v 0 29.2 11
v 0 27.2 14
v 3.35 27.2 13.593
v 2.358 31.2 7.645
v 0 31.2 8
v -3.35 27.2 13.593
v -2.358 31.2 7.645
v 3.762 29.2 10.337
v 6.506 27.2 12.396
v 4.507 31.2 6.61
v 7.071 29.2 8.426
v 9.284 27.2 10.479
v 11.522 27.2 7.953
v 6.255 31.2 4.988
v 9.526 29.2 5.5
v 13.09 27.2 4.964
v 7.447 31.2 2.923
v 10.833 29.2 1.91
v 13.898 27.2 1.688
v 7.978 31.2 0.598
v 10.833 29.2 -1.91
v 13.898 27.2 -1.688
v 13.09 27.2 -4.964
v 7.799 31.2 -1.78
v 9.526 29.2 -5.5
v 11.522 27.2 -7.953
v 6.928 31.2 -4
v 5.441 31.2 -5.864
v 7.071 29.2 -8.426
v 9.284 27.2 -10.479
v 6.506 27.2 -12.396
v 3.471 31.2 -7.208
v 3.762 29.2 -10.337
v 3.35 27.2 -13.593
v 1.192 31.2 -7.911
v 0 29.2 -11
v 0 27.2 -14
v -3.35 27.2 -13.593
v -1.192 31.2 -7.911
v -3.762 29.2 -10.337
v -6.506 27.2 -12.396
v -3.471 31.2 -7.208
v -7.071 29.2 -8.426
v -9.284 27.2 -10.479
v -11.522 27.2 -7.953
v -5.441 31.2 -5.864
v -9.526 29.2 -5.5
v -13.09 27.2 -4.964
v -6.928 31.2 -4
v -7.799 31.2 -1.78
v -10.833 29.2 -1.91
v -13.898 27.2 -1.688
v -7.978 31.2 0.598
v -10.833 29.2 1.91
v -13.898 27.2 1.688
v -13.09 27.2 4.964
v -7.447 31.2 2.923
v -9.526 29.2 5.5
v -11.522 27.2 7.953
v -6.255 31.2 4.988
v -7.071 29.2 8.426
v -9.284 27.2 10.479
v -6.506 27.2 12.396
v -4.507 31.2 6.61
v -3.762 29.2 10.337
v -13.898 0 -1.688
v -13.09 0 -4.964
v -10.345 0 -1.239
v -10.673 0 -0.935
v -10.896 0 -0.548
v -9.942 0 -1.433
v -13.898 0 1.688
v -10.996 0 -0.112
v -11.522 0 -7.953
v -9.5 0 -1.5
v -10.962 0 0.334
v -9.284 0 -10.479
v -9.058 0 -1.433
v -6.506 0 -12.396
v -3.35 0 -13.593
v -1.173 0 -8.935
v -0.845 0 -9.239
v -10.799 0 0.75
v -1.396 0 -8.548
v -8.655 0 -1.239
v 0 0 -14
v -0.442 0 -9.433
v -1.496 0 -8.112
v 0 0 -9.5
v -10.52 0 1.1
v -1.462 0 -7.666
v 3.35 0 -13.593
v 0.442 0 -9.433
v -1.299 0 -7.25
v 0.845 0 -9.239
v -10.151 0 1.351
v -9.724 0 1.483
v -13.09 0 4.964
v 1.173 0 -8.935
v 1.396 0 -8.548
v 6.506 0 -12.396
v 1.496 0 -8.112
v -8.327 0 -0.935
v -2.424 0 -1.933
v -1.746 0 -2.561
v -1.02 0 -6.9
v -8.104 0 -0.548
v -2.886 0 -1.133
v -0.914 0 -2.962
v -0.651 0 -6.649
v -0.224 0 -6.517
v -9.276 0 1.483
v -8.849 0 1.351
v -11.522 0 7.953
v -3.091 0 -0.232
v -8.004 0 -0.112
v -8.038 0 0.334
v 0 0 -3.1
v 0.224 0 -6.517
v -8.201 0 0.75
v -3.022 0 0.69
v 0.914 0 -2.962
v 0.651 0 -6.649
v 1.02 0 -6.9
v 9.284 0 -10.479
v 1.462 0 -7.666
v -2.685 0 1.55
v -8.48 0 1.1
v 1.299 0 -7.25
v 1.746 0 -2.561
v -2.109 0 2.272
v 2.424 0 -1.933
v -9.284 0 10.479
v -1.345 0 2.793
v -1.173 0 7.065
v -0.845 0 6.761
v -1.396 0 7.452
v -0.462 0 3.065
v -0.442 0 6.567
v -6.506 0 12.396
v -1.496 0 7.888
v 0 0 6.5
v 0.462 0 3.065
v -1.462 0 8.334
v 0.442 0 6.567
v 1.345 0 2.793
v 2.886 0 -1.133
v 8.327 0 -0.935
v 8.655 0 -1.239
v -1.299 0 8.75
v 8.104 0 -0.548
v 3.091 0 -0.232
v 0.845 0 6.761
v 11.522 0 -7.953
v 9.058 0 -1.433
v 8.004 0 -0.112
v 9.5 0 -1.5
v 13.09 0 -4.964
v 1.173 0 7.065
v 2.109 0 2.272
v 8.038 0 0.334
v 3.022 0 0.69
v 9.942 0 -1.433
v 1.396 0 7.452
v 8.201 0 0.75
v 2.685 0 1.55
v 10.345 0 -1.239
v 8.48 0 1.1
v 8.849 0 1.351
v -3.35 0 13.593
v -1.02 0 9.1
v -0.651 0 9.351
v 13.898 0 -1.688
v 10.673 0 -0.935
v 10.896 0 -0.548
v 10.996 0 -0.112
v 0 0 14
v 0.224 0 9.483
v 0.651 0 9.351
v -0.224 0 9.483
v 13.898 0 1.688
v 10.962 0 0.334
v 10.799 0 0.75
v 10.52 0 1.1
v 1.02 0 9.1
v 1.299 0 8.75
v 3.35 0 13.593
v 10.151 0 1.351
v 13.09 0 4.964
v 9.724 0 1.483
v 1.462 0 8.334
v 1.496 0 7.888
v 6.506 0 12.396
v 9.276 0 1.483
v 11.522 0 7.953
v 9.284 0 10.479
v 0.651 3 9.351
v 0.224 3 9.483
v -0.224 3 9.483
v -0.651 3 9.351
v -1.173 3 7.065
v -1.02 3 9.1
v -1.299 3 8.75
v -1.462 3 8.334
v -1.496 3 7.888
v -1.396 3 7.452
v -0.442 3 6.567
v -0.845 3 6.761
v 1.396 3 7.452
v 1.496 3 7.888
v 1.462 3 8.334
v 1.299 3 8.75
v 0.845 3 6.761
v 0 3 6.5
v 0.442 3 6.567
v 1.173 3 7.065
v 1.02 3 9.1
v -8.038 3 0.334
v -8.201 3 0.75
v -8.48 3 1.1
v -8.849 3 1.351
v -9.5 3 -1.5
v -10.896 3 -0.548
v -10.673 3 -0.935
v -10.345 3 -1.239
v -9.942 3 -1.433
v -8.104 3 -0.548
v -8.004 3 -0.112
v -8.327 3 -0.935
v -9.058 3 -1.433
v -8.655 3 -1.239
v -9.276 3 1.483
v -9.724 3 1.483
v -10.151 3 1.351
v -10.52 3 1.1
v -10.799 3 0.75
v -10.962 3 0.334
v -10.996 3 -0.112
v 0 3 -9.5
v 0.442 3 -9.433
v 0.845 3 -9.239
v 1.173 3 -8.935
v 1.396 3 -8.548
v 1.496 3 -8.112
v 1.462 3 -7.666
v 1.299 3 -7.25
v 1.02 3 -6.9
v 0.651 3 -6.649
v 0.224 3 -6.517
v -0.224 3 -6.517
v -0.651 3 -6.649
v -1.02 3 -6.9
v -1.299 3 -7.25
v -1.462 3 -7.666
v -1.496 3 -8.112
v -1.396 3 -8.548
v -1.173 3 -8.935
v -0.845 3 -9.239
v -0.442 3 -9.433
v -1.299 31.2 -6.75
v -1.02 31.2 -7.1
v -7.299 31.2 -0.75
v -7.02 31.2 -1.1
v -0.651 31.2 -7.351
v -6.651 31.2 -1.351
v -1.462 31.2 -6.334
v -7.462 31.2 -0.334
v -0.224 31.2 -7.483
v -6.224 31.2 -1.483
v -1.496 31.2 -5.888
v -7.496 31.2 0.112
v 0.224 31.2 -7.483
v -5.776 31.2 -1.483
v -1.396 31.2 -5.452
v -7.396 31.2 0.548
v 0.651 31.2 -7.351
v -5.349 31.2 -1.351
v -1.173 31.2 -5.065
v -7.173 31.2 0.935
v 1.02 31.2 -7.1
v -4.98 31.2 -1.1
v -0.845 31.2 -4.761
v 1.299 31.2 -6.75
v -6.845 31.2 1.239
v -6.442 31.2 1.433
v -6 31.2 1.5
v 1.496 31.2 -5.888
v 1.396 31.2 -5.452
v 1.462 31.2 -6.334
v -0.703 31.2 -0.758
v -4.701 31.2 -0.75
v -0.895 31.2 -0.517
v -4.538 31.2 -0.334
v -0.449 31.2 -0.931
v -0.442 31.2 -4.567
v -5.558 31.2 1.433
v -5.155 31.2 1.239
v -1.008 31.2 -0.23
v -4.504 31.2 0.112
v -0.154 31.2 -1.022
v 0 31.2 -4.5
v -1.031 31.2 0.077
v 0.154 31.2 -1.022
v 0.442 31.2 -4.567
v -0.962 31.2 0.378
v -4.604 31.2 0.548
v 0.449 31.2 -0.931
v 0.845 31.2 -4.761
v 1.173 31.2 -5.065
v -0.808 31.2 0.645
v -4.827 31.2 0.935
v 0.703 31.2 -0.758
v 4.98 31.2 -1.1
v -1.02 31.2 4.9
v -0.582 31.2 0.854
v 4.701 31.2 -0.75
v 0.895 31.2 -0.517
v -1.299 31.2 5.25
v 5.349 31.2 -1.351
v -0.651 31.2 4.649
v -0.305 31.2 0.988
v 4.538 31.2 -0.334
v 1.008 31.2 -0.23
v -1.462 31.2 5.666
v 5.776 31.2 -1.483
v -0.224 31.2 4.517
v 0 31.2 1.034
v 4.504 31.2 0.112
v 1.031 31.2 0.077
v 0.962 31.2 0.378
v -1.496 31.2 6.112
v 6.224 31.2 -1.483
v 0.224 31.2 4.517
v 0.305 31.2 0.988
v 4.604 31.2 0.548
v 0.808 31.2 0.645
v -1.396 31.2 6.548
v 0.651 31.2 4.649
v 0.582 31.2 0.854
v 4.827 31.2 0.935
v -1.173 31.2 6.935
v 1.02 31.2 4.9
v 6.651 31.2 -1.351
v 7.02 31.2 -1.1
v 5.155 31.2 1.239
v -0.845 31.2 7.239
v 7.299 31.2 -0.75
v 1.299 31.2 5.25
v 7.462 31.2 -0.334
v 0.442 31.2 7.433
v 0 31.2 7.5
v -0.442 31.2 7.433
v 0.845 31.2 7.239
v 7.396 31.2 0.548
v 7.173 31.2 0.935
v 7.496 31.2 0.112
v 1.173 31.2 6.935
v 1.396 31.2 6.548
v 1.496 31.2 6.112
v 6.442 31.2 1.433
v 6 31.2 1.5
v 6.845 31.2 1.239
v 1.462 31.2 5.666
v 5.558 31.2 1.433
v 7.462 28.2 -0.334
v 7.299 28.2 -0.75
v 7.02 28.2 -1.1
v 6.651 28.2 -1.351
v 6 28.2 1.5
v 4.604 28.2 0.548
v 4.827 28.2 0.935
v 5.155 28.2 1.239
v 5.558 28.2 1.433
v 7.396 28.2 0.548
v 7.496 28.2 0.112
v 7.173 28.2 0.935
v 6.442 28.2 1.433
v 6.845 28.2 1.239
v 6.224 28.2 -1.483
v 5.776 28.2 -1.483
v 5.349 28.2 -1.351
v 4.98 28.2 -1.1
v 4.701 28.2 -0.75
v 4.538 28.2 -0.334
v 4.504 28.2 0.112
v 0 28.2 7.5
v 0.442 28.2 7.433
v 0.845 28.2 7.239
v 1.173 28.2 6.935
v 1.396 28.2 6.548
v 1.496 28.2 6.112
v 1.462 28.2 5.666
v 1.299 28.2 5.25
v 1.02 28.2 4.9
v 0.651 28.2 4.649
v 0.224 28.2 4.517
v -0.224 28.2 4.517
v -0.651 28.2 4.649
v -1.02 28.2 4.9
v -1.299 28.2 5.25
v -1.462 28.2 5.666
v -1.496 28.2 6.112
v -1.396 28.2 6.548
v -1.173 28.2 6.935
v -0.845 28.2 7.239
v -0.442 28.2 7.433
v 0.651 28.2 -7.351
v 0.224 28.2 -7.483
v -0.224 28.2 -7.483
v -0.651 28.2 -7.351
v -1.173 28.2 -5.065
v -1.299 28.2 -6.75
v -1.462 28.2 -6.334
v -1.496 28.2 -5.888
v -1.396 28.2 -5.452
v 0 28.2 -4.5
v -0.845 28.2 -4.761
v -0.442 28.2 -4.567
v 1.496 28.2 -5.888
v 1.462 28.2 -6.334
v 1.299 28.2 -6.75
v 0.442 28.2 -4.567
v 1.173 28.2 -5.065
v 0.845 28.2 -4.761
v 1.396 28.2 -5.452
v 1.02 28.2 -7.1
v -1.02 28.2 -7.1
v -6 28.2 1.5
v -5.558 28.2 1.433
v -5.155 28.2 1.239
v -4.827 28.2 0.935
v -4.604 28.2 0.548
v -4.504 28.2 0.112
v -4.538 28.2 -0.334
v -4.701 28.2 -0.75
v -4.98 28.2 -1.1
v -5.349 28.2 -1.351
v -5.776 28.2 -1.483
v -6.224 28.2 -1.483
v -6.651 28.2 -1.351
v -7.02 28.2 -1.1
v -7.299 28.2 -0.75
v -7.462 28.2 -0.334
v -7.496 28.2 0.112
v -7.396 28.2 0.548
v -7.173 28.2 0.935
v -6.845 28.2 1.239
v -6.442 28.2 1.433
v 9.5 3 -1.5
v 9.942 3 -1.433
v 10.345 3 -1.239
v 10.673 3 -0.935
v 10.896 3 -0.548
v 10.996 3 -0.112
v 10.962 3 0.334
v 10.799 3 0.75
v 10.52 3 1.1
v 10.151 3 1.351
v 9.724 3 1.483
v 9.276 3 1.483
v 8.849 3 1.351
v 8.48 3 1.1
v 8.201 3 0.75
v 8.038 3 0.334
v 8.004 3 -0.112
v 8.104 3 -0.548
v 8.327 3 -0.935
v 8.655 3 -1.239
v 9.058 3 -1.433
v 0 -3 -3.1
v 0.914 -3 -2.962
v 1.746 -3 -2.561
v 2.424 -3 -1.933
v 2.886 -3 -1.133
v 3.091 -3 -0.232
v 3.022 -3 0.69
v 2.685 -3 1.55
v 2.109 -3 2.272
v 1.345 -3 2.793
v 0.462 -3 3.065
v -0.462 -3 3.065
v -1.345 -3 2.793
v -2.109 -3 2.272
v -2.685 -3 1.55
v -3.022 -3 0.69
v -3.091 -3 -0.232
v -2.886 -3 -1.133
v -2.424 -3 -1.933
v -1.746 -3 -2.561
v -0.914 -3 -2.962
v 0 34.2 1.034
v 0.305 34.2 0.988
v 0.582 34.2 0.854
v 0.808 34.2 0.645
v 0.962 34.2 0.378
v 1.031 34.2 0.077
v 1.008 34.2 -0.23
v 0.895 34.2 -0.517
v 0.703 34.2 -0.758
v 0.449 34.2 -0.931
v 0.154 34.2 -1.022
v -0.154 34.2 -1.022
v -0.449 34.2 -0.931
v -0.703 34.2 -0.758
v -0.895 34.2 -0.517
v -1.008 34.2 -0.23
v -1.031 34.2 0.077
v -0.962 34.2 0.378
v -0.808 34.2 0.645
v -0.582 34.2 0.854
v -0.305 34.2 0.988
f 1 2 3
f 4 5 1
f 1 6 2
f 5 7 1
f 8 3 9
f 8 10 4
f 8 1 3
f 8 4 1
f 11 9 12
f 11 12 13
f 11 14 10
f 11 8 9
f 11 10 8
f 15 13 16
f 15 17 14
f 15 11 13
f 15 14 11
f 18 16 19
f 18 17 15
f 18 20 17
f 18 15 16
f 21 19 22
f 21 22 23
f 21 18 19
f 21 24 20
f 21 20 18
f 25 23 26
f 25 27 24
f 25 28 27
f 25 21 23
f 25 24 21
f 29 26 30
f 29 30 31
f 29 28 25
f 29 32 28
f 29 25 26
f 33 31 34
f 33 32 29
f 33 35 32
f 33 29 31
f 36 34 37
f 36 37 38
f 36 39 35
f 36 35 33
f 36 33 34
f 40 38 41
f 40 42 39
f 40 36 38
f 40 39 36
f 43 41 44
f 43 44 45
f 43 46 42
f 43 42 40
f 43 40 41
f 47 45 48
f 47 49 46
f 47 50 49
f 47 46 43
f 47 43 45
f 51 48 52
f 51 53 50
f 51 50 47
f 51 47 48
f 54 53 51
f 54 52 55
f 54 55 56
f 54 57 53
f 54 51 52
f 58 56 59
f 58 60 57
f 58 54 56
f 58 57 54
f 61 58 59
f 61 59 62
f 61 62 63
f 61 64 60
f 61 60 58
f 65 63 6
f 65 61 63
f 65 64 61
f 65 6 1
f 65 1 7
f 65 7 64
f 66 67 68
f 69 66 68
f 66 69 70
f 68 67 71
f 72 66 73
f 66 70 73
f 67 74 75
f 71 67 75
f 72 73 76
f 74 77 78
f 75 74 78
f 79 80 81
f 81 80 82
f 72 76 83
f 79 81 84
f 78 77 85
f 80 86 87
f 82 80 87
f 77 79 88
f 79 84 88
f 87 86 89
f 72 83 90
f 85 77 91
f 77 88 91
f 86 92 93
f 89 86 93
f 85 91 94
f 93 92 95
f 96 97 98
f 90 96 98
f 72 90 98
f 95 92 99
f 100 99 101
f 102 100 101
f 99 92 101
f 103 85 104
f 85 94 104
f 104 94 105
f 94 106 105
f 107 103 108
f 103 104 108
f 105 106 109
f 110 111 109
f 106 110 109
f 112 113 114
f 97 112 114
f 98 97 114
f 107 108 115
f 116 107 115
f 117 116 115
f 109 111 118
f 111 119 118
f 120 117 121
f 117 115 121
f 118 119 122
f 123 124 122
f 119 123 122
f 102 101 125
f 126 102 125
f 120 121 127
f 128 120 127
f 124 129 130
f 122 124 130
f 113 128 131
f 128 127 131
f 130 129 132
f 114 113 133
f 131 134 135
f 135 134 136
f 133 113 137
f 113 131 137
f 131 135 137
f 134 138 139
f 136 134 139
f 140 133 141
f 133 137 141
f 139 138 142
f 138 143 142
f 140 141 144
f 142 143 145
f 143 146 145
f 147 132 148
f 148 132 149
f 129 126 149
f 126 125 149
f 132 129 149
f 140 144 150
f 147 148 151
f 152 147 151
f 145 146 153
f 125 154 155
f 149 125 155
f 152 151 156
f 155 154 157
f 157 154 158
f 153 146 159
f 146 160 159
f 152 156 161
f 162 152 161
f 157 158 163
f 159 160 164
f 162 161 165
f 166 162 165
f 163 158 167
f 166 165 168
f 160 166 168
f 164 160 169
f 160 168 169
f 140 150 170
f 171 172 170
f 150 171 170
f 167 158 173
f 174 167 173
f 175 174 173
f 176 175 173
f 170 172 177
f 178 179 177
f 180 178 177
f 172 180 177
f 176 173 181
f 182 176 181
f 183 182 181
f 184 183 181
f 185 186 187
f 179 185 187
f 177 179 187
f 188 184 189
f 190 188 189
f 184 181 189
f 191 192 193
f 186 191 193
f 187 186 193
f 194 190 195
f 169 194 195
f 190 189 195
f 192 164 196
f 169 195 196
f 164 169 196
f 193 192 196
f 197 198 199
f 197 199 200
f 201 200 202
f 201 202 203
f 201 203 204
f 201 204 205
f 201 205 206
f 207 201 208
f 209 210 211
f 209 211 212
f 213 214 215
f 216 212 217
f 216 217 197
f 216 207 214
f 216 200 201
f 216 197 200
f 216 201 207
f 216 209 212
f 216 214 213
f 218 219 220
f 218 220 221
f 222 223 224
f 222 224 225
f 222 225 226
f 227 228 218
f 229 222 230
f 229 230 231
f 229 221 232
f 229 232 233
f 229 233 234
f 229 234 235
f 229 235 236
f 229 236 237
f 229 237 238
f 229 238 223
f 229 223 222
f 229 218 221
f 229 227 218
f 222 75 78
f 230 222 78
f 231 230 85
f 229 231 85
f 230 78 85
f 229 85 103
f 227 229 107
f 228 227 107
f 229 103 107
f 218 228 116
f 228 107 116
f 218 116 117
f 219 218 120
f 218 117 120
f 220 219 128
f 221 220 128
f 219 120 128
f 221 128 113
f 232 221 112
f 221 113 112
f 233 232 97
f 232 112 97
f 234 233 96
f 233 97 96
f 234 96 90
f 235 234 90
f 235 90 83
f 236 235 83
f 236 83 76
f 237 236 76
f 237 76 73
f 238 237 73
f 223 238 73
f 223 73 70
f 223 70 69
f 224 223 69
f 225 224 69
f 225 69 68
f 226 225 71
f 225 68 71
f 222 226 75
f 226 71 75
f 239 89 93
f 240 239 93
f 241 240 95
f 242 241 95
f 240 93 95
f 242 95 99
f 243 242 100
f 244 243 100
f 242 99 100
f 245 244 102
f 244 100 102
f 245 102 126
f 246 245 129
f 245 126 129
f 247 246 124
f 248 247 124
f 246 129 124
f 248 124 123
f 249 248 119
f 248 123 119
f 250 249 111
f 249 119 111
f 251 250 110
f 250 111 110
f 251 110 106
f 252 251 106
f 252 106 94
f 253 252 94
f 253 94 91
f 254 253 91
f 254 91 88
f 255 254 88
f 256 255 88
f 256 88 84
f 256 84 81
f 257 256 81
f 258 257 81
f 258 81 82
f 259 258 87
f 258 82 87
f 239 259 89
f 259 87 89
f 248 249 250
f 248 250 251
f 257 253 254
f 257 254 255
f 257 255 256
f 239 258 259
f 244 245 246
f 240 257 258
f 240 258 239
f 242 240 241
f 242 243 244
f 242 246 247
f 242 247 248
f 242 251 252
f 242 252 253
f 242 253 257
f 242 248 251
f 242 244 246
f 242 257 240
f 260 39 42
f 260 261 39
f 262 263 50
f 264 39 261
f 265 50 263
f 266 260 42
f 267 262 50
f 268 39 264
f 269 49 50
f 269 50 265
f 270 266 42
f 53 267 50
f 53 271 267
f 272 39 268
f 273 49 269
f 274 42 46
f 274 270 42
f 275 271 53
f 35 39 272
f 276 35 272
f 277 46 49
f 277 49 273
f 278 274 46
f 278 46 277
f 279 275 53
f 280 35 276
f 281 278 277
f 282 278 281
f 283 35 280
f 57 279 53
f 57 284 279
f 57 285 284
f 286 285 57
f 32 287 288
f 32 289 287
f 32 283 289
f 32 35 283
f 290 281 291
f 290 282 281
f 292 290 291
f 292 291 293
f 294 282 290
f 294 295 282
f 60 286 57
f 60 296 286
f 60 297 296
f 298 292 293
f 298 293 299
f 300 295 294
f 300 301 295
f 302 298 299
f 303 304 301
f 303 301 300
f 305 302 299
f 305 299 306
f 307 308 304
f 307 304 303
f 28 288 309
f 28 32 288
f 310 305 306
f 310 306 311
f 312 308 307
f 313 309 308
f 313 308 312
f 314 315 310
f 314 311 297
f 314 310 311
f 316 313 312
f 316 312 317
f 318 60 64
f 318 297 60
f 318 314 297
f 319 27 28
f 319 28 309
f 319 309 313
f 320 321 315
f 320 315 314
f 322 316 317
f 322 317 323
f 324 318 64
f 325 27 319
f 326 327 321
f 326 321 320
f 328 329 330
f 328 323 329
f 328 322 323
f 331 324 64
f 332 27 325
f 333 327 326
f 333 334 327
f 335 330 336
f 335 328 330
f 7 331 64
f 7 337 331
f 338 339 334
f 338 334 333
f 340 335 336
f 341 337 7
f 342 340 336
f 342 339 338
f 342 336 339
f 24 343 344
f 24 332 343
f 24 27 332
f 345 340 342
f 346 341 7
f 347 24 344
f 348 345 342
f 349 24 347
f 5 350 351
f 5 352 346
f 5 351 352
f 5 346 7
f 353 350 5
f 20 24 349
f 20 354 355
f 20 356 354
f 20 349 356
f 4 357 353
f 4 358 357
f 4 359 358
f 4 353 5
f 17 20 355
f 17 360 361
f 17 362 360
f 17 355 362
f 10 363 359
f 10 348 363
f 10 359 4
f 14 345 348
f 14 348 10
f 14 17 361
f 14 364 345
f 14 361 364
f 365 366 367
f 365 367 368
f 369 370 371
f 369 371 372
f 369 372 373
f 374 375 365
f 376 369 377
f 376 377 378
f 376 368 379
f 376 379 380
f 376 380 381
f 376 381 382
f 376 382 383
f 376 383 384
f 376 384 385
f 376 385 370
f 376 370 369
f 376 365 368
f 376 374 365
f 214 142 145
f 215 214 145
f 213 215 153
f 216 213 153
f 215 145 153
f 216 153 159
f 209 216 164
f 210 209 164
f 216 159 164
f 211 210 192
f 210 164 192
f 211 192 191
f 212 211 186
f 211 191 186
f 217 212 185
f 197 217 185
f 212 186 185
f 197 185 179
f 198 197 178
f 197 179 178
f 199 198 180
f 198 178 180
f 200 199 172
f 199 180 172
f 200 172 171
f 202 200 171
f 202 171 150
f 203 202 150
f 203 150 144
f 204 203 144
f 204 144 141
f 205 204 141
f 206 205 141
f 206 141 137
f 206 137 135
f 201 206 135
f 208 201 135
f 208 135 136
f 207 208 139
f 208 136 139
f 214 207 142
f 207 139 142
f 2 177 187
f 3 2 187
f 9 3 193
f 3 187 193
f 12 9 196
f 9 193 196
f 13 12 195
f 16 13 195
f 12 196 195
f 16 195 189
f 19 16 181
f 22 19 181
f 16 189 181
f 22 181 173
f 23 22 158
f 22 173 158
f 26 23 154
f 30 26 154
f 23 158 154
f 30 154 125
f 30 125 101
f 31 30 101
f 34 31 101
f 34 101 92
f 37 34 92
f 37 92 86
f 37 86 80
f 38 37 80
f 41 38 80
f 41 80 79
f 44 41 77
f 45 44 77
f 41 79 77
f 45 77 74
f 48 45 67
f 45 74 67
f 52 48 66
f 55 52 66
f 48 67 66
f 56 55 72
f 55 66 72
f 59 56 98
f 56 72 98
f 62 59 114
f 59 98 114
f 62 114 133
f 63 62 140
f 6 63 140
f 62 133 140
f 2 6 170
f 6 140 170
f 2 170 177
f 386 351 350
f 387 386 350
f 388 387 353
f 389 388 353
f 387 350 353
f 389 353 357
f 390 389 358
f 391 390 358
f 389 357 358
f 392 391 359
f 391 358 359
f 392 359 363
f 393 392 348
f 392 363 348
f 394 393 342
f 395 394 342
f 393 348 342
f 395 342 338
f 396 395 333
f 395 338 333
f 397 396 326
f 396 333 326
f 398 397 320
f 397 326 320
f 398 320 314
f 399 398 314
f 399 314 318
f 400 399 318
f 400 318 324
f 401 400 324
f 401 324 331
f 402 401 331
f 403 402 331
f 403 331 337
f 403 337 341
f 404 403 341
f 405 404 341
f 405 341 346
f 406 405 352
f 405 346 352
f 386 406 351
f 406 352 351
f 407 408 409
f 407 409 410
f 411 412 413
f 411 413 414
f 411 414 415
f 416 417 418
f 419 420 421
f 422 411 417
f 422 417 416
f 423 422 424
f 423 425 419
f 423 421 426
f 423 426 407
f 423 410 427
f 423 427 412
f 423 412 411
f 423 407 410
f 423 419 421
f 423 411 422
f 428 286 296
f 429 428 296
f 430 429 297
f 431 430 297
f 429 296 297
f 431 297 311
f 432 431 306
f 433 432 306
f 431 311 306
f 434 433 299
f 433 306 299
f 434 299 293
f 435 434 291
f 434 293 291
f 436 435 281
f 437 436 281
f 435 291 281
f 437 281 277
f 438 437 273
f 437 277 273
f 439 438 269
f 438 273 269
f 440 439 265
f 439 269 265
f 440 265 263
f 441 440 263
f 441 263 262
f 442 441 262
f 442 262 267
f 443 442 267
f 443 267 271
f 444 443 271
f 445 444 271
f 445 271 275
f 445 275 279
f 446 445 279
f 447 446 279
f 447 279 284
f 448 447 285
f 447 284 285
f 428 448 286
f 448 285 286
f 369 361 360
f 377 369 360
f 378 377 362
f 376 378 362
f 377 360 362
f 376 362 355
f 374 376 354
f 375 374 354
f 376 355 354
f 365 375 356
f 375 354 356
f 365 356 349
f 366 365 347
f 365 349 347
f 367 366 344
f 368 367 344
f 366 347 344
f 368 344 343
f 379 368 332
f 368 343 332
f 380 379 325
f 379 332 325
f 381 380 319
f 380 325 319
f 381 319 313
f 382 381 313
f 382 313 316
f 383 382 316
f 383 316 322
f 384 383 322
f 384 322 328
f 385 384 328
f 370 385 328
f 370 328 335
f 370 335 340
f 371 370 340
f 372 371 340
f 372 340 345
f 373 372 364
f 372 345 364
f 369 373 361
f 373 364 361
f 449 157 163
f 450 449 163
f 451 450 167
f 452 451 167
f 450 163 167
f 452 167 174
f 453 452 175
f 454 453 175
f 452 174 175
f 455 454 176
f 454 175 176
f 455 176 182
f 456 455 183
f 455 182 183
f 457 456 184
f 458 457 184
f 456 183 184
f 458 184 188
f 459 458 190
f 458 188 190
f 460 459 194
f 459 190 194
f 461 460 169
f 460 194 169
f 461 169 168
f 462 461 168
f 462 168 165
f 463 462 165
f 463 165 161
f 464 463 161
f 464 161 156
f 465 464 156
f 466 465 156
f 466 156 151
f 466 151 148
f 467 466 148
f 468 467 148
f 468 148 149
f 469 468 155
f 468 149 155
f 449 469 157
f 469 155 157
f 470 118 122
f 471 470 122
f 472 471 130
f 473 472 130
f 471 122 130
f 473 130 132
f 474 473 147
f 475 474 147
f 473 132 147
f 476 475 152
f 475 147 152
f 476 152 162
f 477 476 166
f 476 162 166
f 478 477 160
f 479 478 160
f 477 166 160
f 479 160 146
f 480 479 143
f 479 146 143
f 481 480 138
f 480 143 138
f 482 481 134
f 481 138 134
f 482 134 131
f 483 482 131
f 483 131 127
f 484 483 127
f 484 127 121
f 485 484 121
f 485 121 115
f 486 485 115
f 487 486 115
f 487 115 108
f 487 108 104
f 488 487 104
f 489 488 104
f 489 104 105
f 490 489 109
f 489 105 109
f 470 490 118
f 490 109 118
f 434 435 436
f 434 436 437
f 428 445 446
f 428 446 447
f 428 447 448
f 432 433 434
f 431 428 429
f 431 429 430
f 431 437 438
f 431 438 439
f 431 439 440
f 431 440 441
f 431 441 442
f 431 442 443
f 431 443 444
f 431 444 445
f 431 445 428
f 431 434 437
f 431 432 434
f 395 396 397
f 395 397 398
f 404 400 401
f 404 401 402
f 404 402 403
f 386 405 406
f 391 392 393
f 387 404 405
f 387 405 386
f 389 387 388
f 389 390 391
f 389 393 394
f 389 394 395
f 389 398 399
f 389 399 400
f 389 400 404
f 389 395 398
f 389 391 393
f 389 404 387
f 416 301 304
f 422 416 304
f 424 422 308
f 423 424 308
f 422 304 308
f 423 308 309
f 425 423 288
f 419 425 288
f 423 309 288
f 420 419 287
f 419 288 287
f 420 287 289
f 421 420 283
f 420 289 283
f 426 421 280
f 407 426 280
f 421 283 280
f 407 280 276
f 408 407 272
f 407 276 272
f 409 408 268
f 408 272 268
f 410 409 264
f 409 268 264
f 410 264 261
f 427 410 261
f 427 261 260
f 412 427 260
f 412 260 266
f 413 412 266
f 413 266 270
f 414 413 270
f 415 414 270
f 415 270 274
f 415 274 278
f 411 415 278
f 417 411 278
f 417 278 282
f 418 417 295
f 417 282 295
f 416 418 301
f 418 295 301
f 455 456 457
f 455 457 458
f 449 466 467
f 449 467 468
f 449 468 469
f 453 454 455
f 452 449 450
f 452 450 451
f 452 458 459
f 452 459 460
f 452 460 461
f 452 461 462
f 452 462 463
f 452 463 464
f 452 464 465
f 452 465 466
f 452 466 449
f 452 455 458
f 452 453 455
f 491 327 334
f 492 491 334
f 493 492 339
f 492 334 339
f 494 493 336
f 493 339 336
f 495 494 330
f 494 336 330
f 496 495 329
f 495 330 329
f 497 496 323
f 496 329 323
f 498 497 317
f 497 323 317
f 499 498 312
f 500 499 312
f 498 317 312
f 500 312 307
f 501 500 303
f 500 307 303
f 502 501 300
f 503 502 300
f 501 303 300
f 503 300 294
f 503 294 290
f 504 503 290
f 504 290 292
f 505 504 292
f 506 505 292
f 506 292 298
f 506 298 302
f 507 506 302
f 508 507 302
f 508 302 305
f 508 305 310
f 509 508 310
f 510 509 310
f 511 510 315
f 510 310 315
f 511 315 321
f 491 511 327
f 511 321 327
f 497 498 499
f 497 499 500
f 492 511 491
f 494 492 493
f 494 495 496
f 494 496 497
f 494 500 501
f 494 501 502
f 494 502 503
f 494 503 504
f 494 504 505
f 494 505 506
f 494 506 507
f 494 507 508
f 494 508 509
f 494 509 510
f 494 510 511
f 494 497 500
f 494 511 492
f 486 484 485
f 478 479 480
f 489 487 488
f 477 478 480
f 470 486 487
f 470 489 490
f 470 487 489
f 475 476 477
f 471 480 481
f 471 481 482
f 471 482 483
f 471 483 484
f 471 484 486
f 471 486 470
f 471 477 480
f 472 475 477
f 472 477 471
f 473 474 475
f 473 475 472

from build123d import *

# Parameters (mm, degrees)
SKIZZE1_R                       = 14
AUFSATZ_LINEAR_AUSTRAGEN1_DEPTH = 31.2
FASE1_SIZE                      = 4
FASE1_SIZE2                     = 6
SKIZZE2_R                       = 1.033731655
AUFSATZ_LINEAR_AUSTRAGEN2_DEPTH = 3
SKIZZE3_R                       = 1.5
SCHNITT_LINEAR_AUSTRAGEN1_DEPTH = 3
SKIZZE4_R                       = 3.1
AUFSATZ_LINEAR_AUSTRAGEN3_DEPTH = 3
SKIZZE5_R                       = 1.5
SCHNITT_LINEAR_AUSTRAGEN2_DEPTH = 3


with BuildPart() as part:
    # Skizze1 → Aufsatz-Linear austragen1 (new body)
    with BuildSketch(Plane(origin=(0, 0, 0), x_dir=(1, 0, 0), z_dir=(0, 1, 0))):
        with Locations(Location((0, 0, 0), (0, 0, 270))):
            Circle(SKIZZE1_R)
    extrude(amount=AUFSATZ_LINEAR_AUSTRAGEN1_DEPTH)

    # Fase1
    fase1_edges = [part.edges().sort_by_distance(p)[0] for p in [
        (0, 31.2, -14),
    ]]
    fase1_side = [part.faces().sort_by_distance(p)[0] for p in [
        (0, 15.6, -14),
    ]]
    chamfer(fase1_edges, length=FASE1_SIZE, length2=FASE1_SIZE2, reference=fase1_side[0])

    # Skizze2 → Aufsatz-Linear austragen2 (add)
    with BuildSketch(Plane(origin=(0, 31.2, 0), x_dir=(1, 0, 0), z_dir=(0, 1, 0))):
        with Locations(Location((0, 0, 0), (0, 0, 270))):
            Circle(SKIZZE2_R)
    extrude(amount=AUFSATZ_LINEAR_AUSTRAGEN2_DEPTH)

    # Skizze3 → Schnitt-Linear austragen1 (cut)
    with BuildSketch(Plane(origin=(0, 31.2, 0), x_dir=(1, 0, 0), z_dir=(0, 1, 0))):
        with Locations(Location((-6, 0, 0), (0, 0, 270))):
            Circle(SKIZZE3_R)
        with Locations(Location((0, 6, 0), (0, 0, 270))):
            Circle(SKIZZE3_R)
        with Locations(Location((6, 0, 0), (0, 0, 270))):
            Circle(SKIZZE3_R)
        with Locations(Location((0, -6, 0), (0, 0, 270))):
            Circle(SKIZZE3_R)
    extrude(amount=-SCHNITT_LINEAR_AUSTRAGEN1_DEPTH, mode=Mode.SUBTRACT)

    # Skizze4 → Aufsatz-Linear austragen3 (add)
    with BuildSketch(Plane.XZ):
        with Locations(Location((0, 0, 0), (0, 0, 270))):
            Circle(SKIZZE4_R)
    extrude(amount=AUFSATZ_LINEAR_AUSTRAGEN3_DEPTH)

    # Skizze5 → Schnitt-Linear austragen2 (cut)
    with BuildSketch(Plane.XZ):
        with Locations(Location((0, 8, 0), (0, 0, 270))):
            Circle(SKIZZE5_R)
        with Locations(Location((-9.5, 0, 0), (0, 0, 270))):
            Circle(SKIZZE5_R)
        with Locations(Location((9.5, 0, 0), (0, 0, 270))):
            Circle(SKIZZE5_R)
        with Locations(Location((0, -8, 0), (0, 0, 270))):
            Circle(SKIZZE5_R)
    extrude(amount=-SCHNITT_LINEAR_AUSTRAGEN2_DEPTH, mode=Mode.SUBTRACT)


solid = part.part
